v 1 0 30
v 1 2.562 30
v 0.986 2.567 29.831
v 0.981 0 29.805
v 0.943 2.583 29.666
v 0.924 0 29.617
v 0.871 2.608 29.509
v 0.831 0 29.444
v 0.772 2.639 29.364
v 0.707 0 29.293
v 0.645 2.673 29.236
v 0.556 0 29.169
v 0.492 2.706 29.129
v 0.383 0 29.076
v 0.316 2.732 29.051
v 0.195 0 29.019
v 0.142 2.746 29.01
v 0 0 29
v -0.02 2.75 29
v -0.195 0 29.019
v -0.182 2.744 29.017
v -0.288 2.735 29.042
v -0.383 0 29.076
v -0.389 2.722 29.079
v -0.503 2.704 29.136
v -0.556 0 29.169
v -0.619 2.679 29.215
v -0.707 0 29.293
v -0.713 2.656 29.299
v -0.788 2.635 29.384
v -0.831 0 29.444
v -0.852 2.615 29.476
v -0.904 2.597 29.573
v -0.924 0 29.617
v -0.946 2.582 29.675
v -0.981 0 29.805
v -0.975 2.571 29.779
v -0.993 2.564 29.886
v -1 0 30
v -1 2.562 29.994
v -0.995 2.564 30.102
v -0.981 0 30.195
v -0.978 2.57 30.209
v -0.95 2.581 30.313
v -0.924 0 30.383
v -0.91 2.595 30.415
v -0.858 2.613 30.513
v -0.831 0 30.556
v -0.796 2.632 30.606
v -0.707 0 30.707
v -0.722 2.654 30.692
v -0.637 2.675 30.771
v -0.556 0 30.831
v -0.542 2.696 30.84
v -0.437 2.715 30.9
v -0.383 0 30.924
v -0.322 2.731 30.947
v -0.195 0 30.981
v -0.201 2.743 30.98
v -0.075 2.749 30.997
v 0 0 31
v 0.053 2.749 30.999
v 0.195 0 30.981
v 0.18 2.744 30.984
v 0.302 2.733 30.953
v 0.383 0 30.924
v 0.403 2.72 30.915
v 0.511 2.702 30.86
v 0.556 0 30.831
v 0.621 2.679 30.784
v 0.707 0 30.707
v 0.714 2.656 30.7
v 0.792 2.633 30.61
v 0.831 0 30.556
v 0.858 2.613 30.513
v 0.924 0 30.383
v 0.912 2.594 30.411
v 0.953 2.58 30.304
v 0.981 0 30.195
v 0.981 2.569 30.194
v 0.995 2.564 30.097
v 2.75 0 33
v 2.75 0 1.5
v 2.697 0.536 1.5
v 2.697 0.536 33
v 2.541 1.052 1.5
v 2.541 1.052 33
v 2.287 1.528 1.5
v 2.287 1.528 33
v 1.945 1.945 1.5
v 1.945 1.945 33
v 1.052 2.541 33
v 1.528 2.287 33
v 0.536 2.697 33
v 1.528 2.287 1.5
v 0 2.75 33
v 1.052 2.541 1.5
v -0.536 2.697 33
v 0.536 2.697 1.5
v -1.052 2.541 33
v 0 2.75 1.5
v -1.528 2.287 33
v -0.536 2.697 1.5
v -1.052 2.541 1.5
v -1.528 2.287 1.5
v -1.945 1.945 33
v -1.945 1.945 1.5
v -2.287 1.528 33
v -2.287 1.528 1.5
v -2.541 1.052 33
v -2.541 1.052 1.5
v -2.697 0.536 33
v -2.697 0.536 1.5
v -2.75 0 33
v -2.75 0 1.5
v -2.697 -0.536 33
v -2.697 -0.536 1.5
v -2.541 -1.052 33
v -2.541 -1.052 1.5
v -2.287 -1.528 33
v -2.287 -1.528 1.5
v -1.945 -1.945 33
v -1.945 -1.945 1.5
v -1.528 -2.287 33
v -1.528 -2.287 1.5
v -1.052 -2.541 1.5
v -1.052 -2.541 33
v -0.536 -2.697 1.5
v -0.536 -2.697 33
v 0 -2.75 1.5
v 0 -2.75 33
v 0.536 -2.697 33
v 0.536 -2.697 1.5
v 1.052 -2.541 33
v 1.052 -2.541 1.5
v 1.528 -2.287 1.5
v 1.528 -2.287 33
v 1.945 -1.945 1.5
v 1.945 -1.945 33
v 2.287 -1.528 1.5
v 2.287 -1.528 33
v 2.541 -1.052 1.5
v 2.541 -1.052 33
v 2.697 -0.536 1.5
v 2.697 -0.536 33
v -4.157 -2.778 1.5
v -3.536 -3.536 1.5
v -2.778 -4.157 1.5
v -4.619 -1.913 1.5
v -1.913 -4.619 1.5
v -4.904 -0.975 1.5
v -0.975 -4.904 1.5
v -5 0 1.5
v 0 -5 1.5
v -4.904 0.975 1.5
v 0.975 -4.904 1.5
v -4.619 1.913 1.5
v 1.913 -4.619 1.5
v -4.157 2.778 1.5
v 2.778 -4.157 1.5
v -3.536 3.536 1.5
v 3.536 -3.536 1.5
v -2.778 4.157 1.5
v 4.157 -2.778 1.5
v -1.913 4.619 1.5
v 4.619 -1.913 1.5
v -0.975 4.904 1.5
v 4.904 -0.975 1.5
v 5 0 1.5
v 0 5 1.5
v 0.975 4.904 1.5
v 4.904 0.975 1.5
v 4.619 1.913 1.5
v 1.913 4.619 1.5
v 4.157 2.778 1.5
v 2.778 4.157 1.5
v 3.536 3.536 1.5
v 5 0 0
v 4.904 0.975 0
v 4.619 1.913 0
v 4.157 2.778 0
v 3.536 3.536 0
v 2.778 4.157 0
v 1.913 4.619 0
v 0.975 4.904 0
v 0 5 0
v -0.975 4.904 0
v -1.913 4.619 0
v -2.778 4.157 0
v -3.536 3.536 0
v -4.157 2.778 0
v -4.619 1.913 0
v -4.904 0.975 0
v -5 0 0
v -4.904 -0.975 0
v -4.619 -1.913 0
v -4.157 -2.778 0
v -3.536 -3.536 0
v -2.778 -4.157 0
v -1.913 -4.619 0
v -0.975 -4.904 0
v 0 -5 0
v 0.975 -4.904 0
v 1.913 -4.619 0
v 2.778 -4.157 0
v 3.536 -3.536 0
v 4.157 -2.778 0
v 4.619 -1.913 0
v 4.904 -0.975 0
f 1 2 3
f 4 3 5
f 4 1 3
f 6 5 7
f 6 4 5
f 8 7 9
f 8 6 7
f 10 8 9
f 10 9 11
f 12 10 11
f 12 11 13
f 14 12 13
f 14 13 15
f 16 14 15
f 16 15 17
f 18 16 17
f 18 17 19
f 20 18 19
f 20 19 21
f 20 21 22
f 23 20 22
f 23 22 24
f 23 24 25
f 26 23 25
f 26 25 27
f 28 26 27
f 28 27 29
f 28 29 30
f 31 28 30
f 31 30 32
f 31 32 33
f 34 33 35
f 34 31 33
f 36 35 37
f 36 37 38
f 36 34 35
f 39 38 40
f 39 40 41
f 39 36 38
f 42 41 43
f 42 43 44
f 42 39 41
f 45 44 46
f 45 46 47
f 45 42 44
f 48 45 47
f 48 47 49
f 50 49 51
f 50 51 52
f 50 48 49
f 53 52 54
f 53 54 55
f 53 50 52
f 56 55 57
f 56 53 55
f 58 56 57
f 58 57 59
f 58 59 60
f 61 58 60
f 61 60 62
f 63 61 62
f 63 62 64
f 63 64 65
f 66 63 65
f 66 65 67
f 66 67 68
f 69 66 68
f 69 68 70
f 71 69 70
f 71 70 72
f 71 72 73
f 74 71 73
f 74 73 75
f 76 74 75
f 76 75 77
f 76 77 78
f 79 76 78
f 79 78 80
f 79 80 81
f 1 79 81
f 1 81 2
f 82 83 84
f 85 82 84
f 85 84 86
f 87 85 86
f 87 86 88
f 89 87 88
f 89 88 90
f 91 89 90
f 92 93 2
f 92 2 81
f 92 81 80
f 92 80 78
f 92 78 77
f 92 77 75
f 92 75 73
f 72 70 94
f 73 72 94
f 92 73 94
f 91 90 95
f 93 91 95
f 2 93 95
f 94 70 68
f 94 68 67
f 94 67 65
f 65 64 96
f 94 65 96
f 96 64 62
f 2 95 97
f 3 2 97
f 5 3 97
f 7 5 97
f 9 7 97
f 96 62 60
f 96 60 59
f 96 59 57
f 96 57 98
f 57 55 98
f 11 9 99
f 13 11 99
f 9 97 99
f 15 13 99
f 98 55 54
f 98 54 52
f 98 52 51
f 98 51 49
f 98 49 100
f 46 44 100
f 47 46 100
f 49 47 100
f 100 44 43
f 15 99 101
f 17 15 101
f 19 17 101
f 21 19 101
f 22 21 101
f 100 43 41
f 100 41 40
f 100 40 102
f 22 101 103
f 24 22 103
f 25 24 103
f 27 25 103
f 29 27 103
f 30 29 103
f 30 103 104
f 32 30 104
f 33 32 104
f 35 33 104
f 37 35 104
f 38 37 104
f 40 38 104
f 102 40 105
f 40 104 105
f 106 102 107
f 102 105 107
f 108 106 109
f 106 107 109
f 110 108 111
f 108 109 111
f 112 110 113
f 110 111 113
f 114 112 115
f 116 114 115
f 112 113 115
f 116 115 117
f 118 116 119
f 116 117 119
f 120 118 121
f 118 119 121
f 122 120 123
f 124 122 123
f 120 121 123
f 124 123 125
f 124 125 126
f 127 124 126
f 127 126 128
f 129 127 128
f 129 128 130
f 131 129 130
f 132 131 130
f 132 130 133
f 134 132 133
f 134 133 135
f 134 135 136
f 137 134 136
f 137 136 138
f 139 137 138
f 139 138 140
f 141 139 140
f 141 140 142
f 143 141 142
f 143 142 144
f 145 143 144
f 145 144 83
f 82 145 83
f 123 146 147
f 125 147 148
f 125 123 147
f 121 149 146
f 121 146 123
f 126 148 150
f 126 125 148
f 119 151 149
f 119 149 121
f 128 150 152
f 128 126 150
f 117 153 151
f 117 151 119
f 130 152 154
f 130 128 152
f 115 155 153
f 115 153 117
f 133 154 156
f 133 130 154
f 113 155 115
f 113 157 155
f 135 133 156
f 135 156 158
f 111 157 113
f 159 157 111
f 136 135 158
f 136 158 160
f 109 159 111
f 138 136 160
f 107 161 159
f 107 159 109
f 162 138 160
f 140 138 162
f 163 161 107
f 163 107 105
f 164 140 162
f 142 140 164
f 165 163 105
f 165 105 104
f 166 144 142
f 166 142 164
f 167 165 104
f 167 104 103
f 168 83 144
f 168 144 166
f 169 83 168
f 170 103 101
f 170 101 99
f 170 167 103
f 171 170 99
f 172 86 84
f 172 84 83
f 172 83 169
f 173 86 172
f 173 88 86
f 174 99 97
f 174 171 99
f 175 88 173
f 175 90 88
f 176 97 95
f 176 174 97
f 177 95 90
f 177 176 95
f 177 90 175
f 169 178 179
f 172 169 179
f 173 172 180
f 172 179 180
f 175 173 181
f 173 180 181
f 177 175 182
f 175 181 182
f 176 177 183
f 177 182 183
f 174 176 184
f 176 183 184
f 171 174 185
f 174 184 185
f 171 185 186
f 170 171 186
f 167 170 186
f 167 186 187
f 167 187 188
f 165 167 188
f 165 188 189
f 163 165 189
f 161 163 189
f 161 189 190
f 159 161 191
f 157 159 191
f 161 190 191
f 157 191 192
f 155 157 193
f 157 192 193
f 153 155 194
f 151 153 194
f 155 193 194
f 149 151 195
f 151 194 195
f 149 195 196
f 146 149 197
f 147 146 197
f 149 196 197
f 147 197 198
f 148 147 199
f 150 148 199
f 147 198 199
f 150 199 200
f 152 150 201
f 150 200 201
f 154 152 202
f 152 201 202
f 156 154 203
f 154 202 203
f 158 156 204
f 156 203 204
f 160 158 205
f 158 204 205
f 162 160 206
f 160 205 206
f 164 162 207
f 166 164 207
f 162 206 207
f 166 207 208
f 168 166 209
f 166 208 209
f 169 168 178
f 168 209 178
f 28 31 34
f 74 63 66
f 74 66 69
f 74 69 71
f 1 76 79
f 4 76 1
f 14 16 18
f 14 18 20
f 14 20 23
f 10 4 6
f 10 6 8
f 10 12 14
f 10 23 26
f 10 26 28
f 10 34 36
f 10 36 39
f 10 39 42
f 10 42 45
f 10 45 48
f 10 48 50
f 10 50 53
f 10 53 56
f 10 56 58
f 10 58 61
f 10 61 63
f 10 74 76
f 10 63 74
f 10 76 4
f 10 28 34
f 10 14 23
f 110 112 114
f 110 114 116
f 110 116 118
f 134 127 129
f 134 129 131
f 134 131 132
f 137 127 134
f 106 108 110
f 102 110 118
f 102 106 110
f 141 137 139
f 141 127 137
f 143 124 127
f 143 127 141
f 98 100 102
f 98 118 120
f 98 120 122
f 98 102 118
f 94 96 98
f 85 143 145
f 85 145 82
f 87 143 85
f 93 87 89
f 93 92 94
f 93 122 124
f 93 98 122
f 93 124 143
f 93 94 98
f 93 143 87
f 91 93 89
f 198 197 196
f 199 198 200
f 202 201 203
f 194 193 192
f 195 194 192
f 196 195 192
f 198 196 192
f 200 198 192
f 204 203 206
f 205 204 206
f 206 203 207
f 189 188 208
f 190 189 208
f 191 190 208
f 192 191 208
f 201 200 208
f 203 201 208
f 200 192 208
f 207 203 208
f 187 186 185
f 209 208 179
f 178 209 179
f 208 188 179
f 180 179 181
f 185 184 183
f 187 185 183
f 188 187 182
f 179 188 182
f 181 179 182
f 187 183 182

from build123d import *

# Parameters (mm, degrees)
SKETCH1_R           = 5
BOSS_EXTRUDE1_DEPTH = 1.5
SKETCH2_R           = 2.75
BOSS_EXTRUDE2_DEPTH = 33
SKETCH3_R           = 1
CUT_EXTRUDE1_DEPTH  = 6


with BuildPart() as part:
    # Sketch1 → Boss-Extrude1 (new body)
    with BuildSketch(Plane.XY):
        Circle(SKETCH1_R)
    extrude(amount=BOSS_EXTRUDE1_DEPTH)

    # Sketch2 → Boss-Extrude2 (add)
    with BuildSketch(Plane.XY):
        Circle(SKETCH2_R)
    extrude(amount=BOSS_EXTRUDE2_DEPTH)

    # Sketch3 → Cut-Extrude1 (cut, through all)
    with BuildSketch(Plane(origin=(0, 0, 0), x_dir=(1, 0, 0), z_dir=(0, 1, 0))):
        with Locations((0, -30)):
            Circle(SKETCH3_R)
    extrude(amount=CUT_EXTRUDE1_DEPTH, mode=Mode.SUBTRACT)


solid = part.part
